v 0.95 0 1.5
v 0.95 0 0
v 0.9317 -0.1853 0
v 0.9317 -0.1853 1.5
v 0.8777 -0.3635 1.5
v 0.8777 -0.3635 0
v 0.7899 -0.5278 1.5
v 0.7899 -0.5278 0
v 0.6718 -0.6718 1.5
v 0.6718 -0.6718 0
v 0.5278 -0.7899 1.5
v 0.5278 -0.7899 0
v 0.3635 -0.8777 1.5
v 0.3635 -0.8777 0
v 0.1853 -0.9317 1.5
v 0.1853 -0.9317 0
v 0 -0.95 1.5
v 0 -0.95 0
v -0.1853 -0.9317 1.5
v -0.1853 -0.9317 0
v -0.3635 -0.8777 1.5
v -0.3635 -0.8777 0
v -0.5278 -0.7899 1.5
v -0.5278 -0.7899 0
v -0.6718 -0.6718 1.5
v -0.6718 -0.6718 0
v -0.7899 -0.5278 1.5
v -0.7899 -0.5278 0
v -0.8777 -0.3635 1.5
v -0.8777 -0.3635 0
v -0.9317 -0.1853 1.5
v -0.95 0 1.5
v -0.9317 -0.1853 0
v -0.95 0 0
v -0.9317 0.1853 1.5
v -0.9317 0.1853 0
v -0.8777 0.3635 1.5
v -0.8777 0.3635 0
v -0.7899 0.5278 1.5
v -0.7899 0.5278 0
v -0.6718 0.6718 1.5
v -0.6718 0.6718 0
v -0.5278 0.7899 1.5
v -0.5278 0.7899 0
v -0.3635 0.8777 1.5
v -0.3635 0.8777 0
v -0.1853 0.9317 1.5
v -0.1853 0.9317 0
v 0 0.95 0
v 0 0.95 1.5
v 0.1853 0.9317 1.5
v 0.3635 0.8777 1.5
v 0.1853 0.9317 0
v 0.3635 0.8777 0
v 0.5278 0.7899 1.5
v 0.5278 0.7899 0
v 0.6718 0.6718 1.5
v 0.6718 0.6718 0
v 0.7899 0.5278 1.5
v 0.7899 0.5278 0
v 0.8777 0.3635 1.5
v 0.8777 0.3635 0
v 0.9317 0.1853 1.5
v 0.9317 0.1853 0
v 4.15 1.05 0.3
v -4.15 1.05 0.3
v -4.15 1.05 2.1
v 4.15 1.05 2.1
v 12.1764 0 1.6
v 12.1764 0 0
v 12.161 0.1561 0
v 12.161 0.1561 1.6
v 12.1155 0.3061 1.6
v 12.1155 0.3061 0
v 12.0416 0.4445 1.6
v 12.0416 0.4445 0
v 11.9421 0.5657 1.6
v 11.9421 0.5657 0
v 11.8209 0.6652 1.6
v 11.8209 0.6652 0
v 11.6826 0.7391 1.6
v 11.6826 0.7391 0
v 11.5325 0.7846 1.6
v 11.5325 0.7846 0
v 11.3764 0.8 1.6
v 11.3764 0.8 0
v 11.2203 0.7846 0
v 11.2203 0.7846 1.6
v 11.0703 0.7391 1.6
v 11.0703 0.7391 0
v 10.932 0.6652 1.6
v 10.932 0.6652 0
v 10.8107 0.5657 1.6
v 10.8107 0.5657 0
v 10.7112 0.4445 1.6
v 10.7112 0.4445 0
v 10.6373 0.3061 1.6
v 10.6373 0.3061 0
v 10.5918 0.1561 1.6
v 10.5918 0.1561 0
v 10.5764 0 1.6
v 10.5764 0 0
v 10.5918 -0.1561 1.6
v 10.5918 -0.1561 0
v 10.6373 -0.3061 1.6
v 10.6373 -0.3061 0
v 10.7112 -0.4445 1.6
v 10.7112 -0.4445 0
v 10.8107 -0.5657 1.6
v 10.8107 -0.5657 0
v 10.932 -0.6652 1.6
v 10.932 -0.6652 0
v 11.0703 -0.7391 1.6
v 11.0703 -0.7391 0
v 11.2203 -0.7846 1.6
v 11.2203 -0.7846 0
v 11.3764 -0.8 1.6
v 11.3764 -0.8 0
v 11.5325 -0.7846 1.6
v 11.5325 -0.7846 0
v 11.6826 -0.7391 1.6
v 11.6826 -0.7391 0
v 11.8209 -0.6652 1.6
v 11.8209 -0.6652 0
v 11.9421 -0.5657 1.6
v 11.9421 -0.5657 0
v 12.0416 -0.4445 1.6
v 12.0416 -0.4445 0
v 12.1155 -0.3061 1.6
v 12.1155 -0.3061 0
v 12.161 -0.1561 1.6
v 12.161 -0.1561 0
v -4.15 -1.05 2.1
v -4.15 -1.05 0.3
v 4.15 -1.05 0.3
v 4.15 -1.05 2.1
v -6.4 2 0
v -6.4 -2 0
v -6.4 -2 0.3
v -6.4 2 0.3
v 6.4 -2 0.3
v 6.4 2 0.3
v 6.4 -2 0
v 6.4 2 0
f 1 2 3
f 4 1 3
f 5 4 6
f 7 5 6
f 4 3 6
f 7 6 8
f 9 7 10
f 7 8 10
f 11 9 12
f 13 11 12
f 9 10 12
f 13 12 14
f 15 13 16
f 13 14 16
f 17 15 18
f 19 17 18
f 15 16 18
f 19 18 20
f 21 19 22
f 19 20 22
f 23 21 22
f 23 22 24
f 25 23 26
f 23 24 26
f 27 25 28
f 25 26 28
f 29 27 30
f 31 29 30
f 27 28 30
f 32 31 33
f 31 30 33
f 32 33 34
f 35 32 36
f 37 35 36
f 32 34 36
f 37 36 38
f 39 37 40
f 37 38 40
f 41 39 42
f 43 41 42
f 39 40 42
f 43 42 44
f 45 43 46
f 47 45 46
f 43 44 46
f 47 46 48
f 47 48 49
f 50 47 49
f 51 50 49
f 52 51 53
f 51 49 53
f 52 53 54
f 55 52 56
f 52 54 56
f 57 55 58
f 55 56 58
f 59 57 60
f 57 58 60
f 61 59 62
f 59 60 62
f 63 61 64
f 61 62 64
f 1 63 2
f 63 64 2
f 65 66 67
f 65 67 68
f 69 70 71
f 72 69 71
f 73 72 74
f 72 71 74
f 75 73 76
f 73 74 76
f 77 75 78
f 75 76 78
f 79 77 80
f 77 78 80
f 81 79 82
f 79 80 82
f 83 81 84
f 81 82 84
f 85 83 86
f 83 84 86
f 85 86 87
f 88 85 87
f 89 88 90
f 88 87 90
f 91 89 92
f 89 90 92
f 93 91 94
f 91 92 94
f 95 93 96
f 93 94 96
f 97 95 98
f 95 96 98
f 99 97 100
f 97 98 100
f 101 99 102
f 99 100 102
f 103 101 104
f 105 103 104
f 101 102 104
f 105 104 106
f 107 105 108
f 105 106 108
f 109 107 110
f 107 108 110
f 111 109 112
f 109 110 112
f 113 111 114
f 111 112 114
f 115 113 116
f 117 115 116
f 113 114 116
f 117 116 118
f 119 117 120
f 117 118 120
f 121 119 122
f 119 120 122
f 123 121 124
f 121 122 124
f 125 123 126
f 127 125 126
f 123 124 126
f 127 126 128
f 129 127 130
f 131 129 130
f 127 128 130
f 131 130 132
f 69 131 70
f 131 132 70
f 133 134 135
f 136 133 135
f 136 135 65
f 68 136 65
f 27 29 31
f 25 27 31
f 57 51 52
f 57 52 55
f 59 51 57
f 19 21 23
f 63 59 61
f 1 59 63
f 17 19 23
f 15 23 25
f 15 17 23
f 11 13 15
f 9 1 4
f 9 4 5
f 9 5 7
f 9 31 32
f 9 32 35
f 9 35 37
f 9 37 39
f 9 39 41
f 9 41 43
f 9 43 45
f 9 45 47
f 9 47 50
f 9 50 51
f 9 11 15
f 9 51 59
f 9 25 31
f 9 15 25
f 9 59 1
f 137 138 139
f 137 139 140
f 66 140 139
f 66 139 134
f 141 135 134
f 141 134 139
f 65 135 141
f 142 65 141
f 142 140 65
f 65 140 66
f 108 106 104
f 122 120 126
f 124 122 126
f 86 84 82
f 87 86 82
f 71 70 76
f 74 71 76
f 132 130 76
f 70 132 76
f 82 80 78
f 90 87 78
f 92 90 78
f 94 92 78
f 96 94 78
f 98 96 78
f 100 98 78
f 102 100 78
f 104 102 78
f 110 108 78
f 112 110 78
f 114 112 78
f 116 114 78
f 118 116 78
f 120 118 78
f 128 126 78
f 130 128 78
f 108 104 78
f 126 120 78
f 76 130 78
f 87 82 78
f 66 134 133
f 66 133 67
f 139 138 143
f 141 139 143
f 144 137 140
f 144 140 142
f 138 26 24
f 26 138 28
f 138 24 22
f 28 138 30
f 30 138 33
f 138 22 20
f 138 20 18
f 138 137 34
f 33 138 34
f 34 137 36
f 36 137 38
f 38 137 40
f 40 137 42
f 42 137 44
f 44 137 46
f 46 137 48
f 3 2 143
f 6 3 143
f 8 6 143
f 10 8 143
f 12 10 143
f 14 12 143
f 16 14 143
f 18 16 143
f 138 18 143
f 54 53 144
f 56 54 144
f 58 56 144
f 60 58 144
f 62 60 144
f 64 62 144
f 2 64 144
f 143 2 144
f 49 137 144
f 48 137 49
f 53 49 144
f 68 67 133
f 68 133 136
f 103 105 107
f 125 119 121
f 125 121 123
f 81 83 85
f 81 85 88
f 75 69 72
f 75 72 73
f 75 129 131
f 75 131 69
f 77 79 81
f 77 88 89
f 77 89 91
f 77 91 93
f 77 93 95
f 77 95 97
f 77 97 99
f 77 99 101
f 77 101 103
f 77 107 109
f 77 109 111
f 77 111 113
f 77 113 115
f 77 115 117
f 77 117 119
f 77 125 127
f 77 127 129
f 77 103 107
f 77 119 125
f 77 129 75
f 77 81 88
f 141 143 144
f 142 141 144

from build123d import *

# Parameters (mm, degrees)
F0_W     = 12.8
F0_H     = 4
F0_W_2   = 8.3
F0_H_2   = 2.1
F1_DEPTH = 0.3
F2_DEPTH = 2.1
F3_R     = 0.95
F4_DEPTH = 1.5
F5_R     = 0.8
F6_DEPTH = 1.6


with BuildPart() as f1:
    # F0 (on Top) → F1 (new body)
    with BuildSketch(Plane.XY):
        Rectangle(F0_W, F0_H)
        Rectangle(F0_W_2, F0_H_2, mode=Mode.SUBTRACT)
        Rectangle(F0_W_2, F0_H_2)
    extrude(amount=F1_DEPTH)

    # F0 (on Top) → F2 (join)
    with BuildSketch(Plane.XY):
        Rectangle(F0_W_2, F0_H_2)
    extrude(amount=F2_DEPTH)

    # F3 (on face) → F4 (cut)
    with BuildSketch(Plane(origin=(0, 0, 0), x_dir=(1, 0, 0), z_dir=(0, 0, -1))):
        Circle(F3_R)
    extrude(amount=-F4_DEPTH, mode=Mode.SUBTRACT)


with BuildPart() as f6:
    # F5 (on Top) → F6 (new body)
    with BuildSketch(Plane.XY):
        with Locations((11.37642, 0)):
            Circle(F5_R)
    extrude(amount=F6_DEPTH)


solid = Compound([f1.part, f6.part])
